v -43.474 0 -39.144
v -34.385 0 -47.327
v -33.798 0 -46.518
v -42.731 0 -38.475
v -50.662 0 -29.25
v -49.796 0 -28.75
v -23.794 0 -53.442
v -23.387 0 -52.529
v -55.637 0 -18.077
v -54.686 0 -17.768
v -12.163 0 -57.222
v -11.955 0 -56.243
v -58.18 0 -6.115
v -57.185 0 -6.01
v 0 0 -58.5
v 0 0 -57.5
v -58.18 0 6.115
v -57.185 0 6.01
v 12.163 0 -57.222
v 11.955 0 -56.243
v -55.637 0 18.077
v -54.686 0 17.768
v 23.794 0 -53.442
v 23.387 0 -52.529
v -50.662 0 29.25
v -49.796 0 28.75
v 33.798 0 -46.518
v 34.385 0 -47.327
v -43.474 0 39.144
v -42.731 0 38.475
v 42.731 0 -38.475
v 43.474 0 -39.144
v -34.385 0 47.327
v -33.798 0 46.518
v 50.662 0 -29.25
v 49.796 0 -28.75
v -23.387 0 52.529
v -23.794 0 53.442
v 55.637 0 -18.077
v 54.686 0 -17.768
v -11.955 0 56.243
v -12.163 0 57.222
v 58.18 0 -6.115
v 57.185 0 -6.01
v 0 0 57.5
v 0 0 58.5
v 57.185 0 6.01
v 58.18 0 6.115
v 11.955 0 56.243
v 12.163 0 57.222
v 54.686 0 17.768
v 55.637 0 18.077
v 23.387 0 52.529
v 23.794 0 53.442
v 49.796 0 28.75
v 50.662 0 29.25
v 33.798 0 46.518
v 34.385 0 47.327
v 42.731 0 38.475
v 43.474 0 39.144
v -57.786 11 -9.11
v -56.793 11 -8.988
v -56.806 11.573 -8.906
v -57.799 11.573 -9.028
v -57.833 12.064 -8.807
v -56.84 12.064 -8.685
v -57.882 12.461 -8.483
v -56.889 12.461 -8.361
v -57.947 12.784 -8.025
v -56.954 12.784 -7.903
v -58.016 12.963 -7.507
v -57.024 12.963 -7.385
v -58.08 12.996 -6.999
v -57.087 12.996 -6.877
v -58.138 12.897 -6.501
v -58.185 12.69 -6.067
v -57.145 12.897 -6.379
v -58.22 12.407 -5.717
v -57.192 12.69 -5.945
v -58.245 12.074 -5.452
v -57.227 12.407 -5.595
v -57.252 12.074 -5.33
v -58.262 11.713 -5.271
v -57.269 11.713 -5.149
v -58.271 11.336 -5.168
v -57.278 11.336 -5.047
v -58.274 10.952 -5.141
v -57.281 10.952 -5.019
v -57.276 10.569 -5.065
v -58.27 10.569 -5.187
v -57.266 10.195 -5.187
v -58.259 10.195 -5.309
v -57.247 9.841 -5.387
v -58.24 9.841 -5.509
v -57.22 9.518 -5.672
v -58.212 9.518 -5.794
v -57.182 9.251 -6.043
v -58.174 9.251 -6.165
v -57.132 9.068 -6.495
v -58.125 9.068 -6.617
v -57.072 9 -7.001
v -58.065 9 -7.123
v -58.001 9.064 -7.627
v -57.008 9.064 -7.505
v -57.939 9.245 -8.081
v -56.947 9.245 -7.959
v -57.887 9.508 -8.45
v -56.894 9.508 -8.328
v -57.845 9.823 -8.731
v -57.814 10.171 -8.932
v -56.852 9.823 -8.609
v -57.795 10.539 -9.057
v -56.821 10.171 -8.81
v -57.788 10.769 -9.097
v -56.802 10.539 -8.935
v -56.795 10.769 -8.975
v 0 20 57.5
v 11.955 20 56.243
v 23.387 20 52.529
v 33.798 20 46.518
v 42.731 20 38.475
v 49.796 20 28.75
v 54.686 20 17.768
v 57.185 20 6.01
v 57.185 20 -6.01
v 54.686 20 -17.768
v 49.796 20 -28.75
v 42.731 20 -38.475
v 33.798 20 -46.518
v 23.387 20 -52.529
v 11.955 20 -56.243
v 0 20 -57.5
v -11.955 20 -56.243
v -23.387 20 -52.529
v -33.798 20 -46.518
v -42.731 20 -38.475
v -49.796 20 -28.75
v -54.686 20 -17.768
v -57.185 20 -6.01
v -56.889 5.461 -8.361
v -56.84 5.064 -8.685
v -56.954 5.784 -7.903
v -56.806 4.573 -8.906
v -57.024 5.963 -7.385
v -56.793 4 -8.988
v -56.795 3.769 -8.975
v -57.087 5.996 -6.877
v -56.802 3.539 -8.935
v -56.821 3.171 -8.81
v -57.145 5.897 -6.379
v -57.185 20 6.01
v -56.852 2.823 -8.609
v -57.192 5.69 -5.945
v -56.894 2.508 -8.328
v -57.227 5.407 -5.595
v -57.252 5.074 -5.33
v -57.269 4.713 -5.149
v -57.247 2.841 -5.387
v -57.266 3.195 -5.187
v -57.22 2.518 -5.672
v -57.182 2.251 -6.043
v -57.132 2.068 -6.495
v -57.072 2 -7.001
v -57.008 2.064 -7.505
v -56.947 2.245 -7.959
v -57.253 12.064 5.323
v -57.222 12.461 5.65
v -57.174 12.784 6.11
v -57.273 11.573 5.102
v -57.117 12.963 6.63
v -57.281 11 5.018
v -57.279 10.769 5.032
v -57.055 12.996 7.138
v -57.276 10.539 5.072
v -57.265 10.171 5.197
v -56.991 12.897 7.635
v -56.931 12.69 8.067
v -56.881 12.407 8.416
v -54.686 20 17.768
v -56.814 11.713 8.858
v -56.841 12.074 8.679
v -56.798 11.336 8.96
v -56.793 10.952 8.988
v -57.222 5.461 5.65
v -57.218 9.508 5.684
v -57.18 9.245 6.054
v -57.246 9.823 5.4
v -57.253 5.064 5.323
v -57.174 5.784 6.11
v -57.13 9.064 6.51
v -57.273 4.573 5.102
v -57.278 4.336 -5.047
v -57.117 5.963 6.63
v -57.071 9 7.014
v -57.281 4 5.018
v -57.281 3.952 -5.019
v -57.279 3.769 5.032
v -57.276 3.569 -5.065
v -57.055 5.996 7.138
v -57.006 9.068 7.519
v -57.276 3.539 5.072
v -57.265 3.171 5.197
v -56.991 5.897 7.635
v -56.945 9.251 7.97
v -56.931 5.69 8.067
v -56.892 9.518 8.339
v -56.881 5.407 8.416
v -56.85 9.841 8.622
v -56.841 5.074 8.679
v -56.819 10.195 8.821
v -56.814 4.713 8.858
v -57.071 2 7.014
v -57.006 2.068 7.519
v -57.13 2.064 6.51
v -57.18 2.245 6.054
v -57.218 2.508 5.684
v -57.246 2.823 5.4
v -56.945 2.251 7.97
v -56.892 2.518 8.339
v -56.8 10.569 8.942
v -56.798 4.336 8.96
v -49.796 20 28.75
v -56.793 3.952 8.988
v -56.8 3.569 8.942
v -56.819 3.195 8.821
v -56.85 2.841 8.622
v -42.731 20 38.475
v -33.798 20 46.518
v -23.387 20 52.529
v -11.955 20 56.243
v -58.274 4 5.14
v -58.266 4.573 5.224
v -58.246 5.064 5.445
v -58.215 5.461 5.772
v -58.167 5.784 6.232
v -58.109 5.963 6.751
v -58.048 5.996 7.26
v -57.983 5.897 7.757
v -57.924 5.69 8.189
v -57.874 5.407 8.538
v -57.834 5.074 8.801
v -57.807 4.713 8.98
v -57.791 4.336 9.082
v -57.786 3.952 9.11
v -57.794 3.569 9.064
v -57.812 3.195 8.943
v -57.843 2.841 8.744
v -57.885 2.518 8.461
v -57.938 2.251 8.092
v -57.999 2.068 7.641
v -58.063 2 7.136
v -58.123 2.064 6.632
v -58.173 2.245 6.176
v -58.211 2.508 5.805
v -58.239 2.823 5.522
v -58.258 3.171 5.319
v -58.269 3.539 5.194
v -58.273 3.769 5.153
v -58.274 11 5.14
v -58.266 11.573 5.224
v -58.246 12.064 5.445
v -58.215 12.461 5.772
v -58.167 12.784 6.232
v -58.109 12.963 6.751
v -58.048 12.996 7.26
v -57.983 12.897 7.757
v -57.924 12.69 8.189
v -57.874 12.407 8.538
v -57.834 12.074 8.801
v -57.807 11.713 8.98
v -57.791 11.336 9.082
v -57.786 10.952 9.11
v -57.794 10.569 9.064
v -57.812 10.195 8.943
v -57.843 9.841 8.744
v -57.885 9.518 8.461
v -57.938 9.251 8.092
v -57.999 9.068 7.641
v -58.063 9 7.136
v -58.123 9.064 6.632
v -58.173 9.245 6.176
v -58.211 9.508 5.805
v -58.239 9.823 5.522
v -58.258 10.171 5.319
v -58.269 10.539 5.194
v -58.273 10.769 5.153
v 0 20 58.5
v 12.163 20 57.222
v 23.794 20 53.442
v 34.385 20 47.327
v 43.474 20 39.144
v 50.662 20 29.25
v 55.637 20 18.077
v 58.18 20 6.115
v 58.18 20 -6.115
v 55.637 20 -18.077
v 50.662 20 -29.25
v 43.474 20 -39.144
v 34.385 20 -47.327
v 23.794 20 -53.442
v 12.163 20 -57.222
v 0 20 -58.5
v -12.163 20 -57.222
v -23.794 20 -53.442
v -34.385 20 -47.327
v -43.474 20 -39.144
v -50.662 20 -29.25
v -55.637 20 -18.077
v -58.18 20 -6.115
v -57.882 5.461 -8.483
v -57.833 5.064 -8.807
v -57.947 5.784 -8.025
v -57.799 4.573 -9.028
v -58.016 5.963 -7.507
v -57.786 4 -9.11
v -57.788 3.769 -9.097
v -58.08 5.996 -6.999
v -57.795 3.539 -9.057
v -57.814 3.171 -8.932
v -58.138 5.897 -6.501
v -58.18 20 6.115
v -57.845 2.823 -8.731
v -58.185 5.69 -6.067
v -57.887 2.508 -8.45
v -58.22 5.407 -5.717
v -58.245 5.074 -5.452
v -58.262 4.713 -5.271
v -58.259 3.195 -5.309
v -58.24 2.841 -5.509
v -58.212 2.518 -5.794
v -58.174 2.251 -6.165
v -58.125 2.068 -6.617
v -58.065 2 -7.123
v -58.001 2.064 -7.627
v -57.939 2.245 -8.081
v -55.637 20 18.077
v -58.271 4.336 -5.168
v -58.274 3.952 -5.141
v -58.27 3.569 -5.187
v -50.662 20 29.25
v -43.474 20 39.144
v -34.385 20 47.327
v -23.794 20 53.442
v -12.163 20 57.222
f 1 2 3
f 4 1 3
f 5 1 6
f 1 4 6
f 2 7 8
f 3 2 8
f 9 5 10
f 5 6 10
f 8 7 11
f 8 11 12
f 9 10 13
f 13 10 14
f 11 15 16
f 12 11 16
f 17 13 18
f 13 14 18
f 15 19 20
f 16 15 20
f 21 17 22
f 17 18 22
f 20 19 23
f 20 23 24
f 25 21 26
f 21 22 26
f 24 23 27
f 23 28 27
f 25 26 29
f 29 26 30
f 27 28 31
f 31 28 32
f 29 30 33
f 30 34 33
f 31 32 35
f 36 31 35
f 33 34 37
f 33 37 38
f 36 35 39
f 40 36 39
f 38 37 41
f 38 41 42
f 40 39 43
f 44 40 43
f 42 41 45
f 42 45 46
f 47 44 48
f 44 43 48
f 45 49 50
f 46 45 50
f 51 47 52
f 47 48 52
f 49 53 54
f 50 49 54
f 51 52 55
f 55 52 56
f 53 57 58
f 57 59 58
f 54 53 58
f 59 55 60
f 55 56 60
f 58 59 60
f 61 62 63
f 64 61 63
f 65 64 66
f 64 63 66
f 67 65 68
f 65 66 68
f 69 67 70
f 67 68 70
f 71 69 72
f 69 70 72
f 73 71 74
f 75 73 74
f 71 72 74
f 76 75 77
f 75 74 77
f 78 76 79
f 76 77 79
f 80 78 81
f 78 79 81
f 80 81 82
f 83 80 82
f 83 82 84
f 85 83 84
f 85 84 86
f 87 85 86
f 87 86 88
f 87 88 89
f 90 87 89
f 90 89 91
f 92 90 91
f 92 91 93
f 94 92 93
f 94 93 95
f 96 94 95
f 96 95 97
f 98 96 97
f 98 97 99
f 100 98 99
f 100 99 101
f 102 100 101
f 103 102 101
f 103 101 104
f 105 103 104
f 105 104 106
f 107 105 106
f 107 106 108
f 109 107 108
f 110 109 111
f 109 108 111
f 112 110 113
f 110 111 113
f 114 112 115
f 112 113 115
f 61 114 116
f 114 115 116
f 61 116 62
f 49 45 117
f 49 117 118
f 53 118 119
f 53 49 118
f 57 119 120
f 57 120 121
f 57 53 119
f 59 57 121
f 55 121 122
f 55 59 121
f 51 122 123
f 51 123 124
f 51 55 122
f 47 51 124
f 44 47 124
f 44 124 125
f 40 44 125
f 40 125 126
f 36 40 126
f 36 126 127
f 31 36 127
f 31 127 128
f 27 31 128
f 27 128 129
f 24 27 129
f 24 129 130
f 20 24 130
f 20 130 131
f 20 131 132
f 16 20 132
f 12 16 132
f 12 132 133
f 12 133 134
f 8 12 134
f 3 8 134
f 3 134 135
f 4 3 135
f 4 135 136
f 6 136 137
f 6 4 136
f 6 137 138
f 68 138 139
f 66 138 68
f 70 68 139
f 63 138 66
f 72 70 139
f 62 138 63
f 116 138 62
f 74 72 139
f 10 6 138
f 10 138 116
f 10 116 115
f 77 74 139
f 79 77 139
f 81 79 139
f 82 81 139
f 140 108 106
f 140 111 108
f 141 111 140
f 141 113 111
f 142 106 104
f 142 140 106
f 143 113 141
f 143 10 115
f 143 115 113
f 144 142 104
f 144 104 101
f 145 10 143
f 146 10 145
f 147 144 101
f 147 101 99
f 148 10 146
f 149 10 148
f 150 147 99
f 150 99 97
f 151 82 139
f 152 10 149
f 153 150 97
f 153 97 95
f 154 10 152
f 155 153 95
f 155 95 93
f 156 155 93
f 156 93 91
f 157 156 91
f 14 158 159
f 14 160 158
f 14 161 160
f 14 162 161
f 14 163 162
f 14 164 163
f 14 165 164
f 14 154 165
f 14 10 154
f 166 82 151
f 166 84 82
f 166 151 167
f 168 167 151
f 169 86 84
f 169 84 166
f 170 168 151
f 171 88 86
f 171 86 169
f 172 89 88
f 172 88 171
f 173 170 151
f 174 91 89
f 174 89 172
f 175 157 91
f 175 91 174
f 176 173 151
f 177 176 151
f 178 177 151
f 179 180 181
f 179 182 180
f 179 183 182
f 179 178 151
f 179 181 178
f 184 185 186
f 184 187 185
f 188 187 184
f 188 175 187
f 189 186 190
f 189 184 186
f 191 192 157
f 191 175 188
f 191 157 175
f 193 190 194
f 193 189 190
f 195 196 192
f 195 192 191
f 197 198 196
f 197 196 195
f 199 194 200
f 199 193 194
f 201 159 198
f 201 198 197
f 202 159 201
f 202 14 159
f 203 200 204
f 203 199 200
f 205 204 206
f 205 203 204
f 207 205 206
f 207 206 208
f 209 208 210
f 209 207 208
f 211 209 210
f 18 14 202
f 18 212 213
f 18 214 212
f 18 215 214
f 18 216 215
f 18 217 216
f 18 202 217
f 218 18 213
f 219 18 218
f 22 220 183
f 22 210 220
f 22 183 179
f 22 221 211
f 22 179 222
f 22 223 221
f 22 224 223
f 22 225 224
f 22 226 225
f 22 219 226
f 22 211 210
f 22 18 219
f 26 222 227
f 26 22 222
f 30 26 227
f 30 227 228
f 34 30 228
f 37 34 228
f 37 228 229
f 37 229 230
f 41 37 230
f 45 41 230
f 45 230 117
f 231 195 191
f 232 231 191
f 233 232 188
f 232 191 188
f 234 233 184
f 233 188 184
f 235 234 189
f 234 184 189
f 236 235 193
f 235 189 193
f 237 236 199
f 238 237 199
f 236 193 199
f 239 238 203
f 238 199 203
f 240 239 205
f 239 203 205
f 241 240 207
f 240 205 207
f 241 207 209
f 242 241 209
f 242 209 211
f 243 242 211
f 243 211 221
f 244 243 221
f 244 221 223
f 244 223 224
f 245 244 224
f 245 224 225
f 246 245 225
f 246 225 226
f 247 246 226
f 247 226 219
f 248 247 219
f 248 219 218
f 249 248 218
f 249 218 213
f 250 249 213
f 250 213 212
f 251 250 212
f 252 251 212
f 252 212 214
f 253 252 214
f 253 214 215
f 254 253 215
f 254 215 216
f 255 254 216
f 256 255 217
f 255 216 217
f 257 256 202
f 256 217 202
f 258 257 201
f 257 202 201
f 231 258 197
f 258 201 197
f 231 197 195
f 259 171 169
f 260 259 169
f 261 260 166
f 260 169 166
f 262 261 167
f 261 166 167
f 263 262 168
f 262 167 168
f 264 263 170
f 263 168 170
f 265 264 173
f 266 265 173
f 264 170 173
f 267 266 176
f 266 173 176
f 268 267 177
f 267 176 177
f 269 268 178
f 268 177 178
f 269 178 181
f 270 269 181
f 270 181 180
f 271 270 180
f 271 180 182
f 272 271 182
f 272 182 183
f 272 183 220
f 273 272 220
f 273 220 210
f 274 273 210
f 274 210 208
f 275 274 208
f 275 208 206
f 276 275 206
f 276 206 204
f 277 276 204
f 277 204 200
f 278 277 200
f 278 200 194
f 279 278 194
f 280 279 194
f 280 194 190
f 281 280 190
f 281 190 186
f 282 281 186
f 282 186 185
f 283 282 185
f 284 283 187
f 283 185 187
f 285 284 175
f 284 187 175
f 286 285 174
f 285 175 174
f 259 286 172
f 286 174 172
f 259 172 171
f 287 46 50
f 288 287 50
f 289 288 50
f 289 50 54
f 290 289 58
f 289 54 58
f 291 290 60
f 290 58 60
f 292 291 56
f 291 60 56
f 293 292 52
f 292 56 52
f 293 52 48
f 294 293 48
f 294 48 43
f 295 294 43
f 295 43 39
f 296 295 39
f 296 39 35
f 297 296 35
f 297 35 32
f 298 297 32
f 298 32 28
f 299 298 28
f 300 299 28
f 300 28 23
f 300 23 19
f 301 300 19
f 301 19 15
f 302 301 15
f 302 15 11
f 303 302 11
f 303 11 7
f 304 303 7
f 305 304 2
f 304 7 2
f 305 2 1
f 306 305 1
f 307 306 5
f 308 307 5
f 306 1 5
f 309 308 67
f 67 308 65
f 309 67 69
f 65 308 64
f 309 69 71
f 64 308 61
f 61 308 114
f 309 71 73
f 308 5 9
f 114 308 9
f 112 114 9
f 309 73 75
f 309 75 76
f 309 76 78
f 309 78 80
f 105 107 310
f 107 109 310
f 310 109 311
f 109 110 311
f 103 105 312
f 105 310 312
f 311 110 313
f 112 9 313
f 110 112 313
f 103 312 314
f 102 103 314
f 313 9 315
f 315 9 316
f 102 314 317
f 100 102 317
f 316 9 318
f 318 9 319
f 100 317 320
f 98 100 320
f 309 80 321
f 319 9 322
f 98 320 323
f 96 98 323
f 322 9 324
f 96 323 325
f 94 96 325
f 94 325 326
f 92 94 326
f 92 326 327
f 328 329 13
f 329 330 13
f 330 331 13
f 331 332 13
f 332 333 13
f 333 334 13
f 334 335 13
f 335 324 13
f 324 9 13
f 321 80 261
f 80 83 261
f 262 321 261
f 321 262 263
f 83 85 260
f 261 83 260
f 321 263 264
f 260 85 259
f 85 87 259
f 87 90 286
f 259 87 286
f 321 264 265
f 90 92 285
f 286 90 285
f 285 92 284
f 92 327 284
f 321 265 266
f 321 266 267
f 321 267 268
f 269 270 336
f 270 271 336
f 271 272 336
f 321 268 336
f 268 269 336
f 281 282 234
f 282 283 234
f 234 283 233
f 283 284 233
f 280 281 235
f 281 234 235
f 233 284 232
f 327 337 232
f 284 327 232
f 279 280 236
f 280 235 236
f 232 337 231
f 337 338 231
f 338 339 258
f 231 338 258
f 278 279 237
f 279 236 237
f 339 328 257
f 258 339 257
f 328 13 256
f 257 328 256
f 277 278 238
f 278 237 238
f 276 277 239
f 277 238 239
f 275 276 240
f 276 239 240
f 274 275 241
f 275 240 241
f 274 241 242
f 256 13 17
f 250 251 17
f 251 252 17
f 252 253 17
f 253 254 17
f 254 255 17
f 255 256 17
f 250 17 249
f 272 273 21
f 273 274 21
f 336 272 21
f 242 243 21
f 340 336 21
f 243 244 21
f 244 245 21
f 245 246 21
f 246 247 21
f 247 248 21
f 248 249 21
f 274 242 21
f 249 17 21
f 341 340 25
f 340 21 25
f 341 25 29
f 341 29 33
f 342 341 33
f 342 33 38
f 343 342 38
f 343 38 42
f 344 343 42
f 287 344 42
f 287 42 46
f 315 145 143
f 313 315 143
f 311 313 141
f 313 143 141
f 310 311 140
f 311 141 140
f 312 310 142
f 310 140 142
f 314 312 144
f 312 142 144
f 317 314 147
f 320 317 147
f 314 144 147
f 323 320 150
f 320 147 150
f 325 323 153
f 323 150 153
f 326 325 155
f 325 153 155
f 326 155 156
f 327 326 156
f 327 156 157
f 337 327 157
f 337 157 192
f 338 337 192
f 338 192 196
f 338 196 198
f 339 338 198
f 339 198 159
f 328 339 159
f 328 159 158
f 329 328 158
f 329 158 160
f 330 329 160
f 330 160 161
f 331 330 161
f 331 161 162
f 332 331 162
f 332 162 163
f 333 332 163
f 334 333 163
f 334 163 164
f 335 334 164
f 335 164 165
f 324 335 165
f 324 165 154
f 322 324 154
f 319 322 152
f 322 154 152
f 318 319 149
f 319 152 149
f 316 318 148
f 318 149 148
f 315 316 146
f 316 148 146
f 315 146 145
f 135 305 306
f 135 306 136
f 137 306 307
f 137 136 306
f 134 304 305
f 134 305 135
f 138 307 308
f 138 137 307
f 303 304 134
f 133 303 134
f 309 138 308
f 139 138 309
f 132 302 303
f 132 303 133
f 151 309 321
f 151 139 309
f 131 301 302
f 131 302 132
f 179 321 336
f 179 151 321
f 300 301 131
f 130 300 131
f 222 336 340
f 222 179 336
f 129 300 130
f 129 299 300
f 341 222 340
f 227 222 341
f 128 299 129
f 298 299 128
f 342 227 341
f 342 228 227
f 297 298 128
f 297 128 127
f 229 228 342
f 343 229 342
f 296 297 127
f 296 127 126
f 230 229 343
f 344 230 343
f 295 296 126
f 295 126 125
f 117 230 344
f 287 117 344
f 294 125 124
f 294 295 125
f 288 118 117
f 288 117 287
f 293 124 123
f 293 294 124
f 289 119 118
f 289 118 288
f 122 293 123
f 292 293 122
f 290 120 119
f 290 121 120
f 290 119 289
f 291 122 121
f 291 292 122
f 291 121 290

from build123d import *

# Parameters (mm, degrees)
SKETCH_1_R          = 58.5
SKETCH_1_R_2        = 57.5
EXTRUDE_1_DEPTH     = 20
SKETCH_3_R          = 2
CUT_EXTRUDE_1_DEPTH = 71
SKETCH_4_R          = 2
CUT_EXTRUDE_2_DEPTH = 71


with BuildPart() as part:
    # 草图1 → 凸台-拉伸1 (new body)
    with BuildSketch(Plane(origin=(0, 0, 0), x_dir=(1, 0, 0), z_dir=(0, 1, 0))):
        with Locations(Location((0, 0, 0), (0, 0, 270))):
            Circle(SKETCH_1_R)
        with Locations(Location((0, 0, 0), (0, 0, 270))):
            Circle(SKETCH_1_R_2, mode=Mode.SUBTRACT)
    extrude(amount=EXTRUDE_1_DEPTH)

    # 草图3 → 切除-拉伸1 (cut)
    with BuildSketch(Plane(origin=(0, 0, 0), x_dir=(-0.12186934340515121, 0, -0.9925461516413215), z_dir=(0.9925461516413215, 0, -0.12186934340515121))):
        with Locations((0, 11)):
            Circle(SKETCH_3_R)
        with Locations((0, 4)):
            Circle(SKETCH_3_R)
    extrude(amount=-CUT_EXTRUDE_1_DEPTH, mode=Mode.SUBTRACT)

    # 草图4 → 切除-拉伸2 (cut)
    with BuildSketch(Plane(origin=(0, 0, 0), x_dir=(0.12186934340514427, 0, -0.9925461516413224), z_dir=(0.9925461516413224, 0, 0.12186934340514427))):
        with Locations((0, 11)):
            Circle(SKETCH_4_R)
        with Locations((0, 4)):
            Circle(SKETCH_4_R)
    extrude(amount=-CUT_EXTRUDE_2_DEPTH, mode=Mode.SUBTRACT)


solid = part.part
